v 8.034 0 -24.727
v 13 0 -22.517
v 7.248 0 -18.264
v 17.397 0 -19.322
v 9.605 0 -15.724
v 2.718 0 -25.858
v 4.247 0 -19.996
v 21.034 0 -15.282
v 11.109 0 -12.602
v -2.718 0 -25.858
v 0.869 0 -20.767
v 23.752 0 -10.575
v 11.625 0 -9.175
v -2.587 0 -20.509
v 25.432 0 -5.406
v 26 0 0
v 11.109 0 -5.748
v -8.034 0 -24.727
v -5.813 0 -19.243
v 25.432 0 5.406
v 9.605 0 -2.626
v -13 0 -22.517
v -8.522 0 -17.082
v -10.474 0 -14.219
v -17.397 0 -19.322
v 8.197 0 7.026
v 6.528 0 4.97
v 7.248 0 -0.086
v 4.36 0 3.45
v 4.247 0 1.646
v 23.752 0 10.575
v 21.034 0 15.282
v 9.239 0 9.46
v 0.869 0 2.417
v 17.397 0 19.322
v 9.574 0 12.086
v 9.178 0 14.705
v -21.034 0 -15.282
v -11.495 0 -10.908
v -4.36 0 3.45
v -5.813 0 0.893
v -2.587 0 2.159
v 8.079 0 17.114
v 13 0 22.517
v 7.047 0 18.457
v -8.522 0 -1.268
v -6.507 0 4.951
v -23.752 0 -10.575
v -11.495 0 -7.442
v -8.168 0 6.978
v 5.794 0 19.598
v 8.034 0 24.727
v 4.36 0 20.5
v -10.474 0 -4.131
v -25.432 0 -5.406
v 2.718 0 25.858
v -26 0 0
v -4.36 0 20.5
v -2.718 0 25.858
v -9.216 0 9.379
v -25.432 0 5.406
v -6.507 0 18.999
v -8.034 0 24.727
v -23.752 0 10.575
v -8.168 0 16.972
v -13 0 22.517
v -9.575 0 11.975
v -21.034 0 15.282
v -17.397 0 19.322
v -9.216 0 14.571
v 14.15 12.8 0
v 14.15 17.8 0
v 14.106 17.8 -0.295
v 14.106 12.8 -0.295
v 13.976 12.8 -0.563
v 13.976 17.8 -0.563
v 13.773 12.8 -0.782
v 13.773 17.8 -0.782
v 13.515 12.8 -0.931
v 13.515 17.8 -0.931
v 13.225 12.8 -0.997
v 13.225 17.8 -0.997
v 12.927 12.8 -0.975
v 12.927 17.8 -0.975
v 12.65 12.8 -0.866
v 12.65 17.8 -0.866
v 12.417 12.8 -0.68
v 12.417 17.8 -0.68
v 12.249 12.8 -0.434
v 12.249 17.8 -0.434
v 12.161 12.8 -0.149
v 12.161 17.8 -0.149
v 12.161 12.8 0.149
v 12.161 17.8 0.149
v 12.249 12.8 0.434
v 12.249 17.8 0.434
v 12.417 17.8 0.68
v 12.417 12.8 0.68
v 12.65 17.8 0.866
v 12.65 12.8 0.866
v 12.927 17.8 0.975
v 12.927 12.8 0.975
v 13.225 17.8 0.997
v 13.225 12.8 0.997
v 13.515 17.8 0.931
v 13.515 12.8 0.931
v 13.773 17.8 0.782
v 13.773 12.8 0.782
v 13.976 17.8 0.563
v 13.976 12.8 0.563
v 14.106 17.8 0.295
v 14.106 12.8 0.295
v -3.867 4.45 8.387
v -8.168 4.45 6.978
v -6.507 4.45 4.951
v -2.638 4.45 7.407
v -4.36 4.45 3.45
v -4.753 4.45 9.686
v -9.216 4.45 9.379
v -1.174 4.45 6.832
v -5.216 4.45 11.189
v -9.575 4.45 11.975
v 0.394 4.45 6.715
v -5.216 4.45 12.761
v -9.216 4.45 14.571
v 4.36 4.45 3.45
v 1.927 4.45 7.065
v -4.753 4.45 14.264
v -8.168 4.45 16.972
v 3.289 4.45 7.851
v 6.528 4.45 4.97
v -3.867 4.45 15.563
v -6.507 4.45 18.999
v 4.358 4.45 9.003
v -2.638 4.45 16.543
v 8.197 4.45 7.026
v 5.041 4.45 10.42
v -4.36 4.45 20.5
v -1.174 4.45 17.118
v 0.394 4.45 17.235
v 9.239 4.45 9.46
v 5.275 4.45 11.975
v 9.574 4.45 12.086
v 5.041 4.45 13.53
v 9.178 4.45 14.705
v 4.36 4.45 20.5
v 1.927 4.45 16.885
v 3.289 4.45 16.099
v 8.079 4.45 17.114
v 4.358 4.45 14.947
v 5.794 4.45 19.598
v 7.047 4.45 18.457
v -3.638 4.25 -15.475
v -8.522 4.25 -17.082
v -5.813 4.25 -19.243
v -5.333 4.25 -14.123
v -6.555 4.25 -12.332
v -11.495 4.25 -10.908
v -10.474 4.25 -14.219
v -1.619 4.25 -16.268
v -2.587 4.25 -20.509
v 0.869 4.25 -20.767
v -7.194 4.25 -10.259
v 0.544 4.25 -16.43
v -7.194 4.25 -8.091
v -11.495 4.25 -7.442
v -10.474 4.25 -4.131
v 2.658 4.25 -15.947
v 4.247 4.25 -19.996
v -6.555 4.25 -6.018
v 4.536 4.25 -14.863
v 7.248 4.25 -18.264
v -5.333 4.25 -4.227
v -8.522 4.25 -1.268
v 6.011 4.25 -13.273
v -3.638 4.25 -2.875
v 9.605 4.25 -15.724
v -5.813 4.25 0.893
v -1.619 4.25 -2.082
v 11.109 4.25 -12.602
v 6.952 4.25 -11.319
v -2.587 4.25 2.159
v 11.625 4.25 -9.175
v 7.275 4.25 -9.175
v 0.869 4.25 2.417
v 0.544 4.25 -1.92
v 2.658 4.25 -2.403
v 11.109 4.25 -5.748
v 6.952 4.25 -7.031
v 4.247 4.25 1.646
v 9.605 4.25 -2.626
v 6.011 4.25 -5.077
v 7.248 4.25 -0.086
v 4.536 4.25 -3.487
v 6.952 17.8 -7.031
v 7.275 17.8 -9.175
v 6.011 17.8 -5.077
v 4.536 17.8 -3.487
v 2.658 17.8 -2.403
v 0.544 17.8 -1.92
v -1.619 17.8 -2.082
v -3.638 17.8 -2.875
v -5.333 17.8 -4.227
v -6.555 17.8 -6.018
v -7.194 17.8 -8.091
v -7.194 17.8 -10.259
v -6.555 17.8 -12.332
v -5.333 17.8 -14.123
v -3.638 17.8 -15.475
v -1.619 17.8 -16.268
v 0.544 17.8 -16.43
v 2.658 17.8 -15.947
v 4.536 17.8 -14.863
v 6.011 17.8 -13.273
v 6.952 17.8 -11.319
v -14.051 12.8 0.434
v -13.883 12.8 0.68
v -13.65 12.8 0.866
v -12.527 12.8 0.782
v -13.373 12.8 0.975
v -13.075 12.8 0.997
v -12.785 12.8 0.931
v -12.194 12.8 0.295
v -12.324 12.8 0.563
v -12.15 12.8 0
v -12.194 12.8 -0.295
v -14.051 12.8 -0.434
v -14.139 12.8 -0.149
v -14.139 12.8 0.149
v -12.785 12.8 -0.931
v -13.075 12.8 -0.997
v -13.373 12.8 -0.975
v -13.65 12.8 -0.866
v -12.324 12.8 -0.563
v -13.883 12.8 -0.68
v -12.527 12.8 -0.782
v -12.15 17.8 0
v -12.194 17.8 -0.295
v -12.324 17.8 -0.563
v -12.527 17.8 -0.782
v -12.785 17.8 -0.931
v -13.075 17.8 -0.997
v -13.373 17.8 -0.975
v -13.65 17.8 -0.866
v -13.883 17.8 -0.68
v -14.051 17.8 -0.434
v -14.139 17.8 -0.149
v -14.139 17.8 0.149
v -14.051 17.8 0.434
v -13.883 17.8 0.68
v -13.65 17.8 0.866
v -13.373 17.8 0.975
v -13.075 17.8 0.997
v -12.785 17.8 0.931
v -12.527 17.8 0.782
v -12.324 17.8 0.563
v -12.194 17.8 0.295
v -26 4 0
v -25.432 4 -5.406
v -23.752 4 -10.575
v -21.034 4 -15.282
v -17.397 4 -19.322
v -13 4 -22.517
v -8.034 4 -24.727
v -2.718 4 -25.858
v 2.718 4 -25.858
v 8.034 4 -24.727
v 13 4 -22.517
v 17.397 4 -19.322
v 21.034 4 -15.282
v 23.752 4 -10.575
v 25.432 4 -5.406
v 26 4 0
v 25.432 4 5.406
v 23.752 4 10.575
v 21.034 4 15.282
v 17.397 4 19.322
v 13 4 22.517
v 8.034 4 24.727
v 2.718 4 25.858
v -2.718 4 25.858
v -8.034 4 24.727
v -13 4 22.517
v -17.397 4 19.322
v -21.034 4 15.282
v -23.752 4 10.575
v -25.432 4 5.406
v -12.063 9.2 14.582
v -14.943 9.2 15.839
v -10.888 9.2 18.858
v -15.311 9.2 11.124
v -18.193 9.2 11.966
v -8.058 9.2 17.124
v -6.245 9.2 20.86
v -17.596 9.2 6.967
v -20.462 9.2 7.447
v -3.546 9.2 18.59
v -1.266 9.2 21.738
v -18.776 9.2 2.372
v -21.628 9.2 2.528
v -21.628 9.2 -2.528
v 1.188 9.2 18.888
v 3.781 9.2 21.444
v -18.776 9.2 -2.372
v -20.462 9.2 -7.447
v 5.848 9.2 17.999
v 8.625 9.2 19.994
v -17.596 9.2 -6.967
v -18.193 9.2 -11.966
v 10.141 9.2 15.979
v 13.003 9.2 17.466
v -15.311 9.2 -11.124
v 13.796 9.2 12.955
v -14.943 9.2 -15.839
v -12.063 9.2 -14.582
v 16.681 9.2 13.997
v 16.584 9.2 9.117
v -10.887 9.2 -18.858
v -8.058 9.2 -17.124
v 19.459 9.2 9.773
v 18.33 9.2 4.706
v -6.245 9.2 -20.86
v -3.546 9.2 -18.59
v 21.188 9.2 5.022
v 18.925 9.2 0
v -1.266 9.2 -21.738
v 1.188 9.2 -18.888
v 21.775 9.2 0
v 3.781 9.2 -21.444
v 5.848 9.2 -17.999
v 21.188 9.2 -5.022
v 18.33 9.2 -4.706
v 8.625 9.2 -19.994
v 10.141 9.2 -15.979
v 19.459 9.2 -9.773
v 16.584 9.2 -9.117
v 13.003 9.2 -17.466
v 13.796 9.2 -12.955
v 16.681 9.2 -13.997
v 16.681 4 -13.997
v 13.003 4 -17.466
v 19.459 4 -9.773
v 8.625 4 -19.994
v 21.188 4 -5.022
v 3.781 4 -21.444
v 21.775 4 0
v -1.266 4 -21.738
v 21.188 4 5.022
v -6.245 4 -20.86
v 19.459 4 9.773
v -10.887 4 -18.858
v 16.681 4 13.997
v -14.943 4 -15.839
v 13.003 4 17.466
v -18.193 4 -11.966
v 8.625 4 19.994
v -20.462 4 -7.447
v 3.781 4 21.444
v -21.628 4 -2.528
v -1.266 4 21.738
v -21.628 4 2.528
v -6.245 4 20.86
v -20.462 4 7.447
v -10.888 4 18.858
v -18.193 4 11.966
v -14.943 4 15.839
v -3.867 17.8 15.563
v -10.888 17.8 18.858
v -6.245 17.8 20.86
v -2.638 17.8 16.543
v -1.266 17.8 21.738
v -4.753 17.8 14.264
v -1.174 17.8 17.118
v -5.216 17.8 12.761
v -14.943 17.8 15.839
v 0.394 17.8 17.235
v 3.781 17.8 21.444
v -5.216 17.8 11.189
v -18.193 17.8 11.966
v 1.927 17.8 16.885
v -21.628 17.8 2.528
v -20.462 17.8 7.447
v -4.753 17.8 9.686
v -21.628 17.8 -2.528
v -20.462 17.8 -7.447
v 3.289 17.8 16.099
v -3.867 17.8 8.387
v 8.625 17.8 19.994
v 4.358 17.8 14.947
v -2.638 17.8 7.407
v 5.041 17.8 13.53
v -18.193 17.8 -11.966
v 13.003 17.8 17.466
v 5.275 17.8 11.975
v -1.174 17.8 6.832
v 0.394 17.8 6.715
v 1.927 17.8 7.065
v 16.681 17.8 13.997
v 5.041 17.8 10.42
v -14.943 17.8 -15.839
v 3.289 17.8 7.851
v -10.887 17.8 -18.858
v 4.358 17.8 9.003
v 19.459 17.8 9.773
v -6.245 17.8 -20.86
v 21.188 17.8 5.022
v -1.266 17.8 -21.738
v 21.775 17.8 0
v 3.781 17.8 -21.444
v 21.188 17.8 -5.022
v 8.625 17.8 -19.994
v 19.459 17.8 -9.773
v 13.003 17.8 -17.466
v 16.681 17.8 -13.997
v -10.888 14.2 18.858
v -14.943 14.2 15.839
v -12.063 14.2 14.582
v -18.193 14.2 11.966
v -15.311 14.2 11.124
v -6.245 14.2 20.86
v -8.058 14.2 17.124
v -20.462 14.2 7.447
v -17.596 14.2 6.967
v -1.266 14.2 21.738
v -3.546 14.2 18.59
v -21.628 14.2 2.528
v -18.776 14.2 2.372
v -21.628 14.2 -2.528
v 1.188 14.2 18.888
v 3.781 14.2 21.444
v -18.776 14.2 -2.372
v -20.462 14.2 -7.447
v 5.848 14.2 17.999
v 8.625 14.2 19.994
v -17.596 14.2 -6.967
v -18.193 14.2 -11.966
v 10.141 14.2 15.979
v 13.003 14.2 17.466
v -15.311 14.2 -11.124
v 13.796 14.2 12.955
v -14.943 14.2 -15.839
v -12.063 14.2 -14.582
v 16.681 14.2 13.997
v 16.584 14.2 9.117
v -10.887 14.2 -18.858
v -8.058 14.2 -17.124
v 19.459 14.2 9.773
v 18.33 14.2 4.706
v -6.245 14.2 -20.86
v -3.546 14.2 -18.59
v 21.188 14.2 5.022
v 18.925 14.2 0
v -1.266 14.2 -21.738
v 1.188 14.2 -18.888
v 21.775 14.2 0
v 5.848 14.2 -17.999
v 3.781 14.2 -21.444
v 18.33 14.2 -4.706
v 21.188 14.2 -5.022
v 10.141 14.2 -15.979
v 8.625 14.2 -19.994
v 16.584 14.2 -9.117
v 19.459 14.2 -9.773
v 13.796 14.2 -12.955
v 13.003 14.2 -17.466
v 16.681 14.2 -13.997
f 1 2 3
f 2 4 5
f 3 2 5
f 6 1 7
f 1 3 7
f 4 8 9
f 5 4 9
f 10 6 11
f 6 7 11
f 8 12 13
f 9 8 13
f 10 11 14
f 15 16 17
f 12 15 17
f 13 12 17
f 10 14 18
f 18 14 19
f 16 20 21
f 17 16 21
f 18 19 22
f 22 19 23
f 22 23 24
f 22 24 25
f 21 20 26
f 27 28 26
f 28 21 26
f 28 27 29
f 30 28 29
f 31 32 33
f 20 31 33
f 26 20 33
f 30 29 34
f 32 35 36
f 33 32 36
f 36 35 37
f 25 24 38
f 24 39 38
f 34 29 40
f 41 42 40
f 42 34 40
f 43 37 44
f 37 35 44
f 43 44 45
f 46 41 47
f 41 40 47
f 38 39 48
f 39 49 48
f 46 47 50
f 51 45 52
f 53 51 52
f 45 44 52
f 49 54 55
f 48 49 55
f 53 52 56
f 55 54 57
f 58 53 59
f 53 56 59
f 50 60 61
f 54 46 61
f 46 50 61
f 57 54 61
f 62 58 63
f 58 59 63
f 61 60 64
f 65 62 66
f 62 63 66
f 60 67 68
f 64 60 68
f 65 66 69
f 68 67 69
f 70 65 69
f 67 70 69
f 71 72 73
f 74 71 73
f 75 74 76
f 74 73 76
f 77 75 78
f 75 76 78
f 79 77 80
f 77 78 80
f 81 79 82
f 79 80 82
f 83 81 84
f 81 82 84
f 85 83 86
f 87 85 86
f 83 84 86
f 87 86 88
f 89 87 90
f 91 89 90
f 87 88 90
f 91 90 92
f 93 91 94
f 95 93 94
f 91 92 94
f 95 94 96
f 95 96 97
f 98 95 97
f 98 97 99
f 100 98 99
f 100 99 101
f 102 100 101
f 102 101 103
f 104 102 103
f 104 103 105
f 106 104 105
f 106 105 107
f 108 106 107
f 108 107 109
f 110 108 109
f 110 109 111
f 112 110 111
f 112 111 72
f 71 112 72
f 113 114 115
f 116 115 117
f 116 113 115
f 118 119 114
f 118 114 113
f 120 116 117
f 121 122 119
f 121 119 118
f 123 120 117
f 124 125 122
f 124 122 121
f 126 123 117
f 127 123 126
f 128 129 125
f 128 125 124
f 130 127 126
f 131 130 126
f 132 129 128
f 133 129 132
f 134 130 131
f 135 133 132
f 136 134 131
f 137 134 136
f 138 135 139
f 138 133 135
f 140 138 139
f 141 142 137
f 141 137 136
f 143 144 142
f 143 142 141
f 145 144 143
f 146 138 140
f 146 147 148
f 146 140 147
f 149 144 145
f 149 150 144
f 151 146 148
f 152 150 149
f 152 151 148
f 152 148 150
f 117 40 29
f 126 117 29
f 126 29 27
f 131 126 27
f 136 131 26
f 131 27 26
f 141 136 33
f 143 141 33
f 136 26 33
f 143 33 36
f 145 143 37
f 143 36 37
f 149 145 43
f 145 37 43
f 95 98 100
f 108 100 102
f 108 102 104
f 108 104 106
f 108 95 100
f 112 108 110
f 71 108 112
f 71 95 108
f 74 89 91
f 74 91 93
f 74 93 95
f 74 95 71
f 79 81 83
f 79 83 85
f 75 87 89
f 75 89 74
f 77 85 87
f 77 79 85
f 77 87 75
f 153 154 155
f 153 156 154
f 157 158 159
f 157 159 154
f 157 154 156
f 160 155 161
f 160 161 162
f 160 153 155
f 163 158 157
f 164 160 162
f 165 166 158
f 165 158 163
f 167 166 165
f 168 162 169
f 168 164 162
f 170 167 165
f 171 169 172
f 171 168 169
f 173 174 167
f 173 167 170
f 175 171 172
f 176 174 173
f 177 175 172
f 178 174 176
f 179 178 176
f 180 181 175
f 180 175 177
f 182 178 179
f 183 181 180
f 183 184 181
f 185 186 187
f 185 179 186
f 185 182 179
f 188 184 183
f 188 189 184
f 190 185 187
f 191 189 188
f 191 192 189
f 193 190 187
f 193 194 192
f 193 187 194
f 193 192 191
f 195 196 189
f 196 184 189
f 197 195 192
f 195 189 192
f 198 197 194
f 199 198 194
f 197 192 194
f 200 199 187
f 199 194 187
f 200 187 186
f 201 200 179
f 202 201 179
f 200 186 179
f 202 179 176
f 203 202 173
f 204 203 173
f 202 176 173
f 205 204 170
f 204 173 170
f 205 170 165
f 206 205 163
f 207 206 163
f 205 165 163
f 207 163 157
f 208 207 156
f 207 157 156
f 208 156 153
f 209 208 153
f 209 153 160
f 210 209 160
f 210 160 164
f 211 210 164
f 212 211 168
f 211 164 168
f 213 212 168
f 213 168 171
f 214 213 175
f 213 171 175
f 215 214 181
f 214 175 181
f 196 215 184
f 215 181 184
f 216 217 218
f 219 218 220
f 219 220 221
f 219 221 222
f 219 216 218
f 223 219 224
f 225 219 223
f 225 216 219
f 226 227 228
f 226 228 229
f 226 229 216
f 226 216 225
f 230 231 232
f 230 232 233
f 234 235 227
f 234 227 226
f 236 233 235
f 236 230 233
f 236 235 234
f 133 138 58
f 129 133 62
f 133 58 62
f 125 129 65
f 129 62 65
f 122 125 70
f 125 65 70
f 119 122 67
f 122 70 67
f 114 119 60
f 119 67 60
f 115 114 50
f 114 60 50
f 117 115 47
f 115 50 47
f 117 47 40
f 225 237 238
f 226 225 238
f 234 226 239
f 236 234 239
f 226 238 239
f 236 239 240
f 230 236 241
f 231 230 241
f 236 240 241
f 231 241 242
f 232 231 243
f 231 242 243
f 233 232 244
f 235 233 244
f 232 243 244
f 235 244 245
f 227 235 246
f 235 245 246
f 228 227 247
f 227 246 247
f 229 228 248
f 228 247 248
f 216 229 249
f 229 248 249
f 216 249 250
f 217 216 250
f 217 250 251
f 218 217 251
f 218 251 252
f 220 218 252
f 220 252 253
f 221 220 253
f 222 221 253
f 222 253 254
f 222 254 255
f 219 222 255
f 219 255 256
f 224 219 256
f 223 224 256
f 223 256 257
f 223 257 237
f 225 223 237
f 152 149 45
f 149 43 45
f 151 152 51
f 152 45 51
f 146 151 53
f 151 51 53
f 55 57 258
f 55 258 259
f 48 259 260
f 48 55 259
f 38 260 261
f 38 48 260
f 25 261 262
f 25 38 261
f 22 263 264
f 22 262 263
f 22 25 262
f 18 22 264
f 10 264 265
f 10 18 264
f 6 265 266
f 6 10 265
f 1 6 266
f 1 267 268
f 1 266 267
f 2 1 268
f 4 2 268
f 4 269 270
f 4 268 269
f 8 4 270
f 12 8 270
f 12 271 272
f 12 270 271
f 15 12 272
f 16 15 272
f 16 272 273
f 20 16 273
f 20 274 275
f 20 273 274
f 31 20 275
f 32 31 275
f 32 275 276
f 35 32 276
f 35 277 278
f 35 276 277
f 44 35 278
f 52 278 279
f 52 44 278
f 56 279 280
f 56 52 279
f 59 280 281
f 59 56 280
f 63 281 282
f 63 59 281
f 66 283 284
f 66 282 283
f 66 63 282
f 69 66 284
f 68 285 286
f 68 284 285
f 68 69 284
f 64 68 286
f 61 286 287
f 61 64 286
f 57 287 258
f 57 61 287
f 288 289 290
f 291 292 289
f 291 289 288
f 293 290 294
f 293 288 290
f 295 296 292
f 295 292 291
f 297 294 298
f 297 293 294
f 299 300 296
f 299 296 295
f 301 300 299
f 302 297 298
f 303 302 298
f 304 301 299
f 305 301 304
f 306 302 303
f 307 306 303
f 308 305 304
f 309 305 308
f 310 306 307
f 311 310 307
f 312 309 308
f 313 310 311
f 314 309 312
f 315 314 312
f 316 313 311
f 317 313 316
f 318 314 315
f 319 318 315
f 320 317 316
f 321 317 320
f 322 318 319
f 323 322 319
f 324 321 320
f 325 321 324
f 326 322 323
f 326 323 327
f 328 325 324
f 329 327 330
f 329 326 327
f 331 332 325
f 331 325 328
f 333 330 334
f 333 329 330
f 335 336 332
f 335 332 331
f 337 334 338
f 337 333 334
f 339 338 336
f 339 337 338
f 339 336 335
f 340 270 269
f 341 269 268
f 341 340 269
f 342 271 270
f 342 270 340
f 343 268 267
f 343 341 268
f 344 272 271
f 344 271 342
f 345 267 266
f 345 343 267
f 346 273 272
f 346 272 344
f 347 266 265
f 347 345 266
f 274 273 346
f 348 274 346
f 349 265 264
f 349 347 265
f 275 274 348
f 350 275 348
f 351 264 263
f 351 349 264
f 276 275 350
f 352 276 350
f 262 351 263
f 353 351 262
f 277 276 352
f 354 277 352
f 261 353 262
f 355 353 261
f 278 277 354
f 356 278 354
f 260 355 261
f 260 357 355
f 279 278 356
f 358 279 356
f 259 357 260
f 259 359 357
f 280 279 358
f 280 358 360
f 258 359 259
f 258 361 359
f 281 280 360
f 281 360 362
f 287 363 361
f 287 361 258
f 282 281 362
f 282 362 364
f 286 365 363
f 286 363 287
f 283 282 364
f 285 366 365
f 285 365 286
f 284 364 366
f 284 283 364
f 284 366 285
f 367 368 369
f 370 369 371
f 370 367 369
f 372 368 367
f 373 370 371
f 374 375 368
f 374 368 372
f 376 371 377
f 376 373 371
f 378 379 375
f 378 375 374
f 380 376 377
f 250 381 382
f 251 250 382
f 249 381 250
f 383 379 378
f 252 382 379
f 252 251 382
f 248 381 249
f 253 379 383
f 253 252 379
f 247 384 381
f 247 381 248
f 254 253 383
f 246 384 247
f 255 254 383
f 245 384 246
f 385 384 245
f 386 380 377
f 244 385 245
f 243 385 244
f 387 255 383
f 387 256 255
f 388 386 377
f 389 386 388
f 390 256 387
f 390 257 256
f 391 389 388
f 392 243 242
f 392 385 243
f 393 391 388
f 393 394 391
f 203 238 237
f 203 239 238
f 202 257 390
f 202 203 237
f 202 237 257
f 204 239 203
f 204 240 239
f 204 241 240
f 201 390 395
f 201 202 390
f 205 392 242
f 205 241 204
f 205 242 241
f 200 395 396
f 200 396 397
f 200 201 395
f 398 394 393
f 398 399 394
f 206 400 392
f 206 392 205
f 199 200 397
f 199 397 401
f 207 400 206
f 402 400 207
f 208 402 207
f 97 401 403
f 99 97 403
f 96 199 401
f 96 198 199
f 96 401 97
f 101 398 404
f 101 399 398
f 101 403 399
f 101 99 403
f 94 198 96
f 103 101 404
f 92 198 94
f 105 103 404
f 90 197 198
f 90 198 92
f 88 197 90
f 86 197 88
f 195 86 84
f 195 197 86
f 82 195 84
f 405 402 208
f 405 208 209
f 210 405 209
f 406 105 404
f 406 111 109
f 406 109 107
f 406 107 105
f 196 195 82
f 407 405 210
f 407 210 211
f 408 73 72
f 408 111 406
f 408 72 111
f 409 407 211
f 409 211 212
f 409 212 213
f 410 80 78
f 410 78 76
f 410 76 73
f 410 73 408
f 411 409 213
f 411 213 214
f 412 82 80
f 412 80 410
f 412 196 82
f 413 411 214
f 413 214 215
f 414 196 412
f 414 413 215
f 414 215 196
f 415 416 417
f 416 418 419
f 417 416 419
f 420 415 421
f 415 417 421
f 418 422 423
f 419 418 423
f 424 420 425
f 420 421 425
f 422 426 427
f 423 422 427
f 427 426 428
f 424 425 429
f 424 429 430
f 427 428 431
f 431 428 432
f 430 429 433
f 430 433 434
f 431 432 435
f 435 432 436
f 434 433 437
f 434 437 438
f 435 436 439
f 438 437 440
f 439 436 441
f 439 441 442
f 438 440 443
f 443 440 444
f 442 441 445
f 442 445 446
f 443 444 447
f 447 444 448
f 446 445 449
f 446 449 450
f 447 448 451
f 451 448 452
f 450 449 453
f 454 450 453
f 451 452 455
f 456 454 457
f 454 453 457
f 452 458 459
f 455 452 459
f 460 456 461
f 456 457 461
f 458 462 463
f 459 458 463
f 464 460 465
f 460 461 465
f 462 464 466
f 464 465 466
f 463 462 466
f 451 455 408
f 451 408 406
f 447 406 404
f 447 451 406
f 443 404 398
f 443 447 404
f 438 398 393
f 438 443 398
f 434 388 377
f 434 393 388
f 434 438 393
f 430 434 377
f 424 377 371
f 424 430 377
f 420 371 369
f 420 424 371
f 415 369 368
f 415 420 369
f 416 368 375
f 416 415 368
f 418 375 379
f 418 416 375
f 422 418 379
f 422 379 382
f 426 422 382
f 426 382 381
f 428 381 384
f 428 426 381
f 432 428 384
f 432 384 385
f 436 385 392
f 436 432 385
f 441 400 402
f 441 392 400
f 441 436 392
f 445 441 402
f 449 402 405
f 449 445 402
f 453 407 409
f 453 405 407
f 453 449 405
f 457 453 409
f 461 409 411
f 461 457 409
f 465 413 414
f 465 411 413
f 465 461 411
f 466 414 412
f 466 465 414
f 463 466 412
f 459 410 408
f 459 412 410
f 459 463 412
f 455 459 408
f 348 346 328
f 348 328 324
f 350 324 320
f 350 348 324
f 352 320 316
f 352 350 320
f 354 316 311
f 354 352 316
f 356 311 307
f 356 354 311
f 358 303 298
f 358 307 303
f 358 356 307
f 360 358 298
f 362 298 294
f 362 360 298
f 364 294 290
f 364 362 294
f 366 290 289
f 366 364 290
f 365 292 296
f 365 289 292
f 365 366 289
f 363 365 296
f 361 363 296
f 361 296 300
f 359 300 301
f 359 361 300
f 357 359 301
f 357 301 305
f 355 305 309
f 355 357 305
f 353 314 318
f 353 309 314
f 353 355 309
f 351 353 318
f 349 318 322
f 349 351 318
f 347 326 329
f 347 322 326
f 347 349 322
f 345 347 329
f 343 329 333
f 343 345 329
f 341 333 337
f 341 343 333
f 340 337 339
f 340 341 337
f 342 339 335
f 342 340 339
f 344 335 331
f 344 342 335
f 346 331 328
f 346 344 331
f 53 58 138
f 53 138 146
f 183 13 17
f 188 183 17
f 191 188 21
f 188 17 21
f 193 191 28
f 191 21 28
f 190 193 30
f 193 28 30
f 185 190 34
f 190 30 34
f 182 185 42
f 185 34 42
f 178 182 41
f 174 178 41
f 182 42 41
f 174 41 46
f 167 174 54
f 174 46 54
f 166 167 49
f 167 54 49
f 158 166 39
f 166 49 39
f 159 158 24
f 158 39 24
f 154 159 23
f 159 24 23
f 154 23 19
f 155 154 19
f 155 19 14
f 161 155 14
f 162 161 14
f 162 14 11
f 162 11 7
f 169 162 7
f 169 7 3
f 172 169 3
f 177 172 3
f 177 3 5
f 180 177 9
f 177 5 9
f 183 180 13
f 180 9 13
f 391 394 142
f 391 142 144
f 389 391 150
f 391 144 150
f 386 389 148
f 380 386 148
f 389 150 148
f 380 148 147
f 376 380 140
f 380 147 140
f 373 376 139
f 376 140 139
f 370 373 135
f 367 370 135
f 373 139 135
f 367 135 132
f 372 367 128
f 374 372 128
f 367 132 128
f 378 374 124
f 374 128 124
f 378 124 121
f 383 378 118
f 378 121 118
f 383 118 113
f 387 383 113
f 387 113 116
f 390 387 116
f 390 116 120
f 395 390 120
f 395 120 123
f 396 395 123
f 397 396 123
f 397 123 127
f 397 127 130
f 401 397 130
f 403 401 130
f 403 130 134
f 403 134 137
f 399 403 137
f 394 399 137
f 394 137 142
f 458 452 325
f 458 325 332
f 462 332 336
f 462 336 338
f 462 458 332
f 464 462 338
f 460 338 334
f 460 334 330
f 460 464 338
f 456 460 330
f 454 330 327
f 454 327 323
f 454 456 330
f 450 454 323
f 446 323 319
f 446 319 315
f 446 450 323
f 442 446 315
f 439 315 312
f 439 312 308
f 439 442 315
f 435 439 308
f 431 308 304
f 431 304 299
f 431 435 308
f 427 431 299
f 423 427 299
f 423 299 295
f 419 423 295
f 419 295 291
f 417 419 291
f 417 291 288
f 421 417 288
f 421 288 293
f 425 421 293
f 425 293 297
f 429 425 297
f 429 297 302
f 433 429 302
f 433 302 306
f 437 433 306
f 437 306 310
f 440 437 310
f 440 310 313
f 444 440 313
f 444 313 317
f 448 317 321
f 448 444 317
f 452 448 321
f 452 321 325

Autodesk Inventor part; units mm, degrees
ref_plane "YZ Plane" through (0, 0, 0) normal (1, 0, 0) x (0, 1, 0)
ref_plane "XZ Plane" through (0, 0, 0) normal (0, 1, 0) x (-1, 0, 0)
sketch "Boceto1" plane through (0, 0, 0) normal (0, 1, 0) x (-1, 0, 0)
  circle A0 centre (0, 0) radius 26
  dimension "d0" = 52
extrude "Extrusión1" add sketch "Boceto1" along normal blind 4
sketch "Boceto2" plane through (0, 4, 0) normal (0, 1, 0) x (1, 0, 0)
  circle A0 centre (0, 0) radius 21.775
  dimension "d3" = 43.55
extrude "Extrusión2" add sketch "Boceto2" along normal blind 13.8
ref_plane "Plano de trabajo1" through (0, 14.2, 0) normal (0, 1, 0) x (1, 0, 0)
sketch "Boceto6" plane through (0, 14.2, 0) normal (0, 1, 0) x (1, 0, 0)
  circle A0 centre (0, 0) radius 21.775
  circle A1 centre (0, 0) radius 18.925
  dimension "d18" = 37.85
extrude "Extrusión6" cut sketch "Boceto6" against normal blind 5
sketch "Boceto7" plane through (0, 0, 0) normal (0, -1, 0) x (1, 0, 0)
  circle A0 centre (0, 0) radius 18.925 projected
  circle A1 centre (0, 0) radius 21.775 projected
  circle A2 centre (0, 0) radius 26 projected
  line L0 (0, 26) -> (0, 20.5)
  line L1 (0, 20.5) -> (0, 3.45)
  arc A3 (8.0792, 17.1138) -> (4.3595, 20.5) centre (0, 11.975) ccw
  line L2 (0, 3.45) -> (4.3595, 3.45)
  line L3 (0, 3.45) -> (-4.3595, 3.45)
  line L4 (0, 20.5) -> (4.3595, 20.5)
  line L5 (0, 20.5) -> (-4.3595, 20.5)
  arc A4 (4.3595, 3.45) -> (8.0792, 17.1138) centre (0, 11.975) ccw
  arc A5 (-4.3595, 3.45) -> (4.3595, 3.45) centre (0, 11.975) ccw
  arc A6 (4.3595, 20.5) -> (-4.3595, 20.5) centre (0, 11.975) ccw
  arc A7 (-4.3595, 20.5) -> (-4.3595, 3.45) centre (0, 11.975) ccw
  dimension "d21" = 5.5
  dimension "d22" = 17.05
  dimension "d23" = 19.15
extrude "Extrusión7" cut sketch "Boceto7" against normal blind 4.45 contours A4 L2 L1 A0 | A0 L1 L4 A3 | A7 L5 L1 A0 | A0 L1 L3 A7
sketch "Boceto8" plane through (0, 4.45, 0) normal (0, -1, 0) x (1, 0, 0)
  arc A0 (-4.3595, 20.5) -> (-4.3595, 3.45) centre (0, 11.975) ccw projected
  circle A1 centre (0, 11.975) radius 5.275
  point P0 (0, 0)
  dimension "d26" = 10.55
extrude "Extrusión8" cut sketch "Boceto8" against normal blind 15
sketch "Boceto9" plane through (0, 0, 0) normal (0, -1, 0) x (1, 0, 0)
  line L0 (4.3595, 3.45) -> (-4.3595, 3.45) projected
  line L1 (0, 3.45) -> (0, 2.45)
  line L2 (0, 2.45) -> (0, -20.8)
  circle A0 centre (0, -9.175) radius 11.625
  point P0 (0, 0)
  dimension "d29" = 1
  dimension "d30" = 23.25
extrude "Extrusión9" cut sketch "Boceto9" against normal blind 4.25
sketch "Boceto10" plane through (0, 4.25, -9.175) normal (0, -1, 0) x (1, 0, 0)
  circle A0 centre (0, 0) radius 7.275
  point P0 (0, 9.175)
  dimension "d33" = 14.55
extrude "Extrusión10" cut sketch "Boceto10" against normal up to surface (13.55 mm away)
thread "Rosca2" size "M15x1.5" class "6H" standard "ANSI Metric M Profile" full length
sketch "Boceto11" plane through (0, 17.8, 0) normal (0, 1, 0) x (1, 0, 0)
  line L0 (0, 0) -> (-13.15, 0)
  line L1 (0, 0) -> (13.15, 0)
  circle A0 centre (-13.15, 0) radius 1
  circle A1 centre (13.15, 0) radius 1
  dimension "d38" = 13.15
  dimension "d39" = 13.15
  dimension "d40" = 2
  dimension "d41" = 2
extrude "Extrusión11" cut sketch "Boceto11" against normal blind 5
properties part number "Pieza_sonar"
